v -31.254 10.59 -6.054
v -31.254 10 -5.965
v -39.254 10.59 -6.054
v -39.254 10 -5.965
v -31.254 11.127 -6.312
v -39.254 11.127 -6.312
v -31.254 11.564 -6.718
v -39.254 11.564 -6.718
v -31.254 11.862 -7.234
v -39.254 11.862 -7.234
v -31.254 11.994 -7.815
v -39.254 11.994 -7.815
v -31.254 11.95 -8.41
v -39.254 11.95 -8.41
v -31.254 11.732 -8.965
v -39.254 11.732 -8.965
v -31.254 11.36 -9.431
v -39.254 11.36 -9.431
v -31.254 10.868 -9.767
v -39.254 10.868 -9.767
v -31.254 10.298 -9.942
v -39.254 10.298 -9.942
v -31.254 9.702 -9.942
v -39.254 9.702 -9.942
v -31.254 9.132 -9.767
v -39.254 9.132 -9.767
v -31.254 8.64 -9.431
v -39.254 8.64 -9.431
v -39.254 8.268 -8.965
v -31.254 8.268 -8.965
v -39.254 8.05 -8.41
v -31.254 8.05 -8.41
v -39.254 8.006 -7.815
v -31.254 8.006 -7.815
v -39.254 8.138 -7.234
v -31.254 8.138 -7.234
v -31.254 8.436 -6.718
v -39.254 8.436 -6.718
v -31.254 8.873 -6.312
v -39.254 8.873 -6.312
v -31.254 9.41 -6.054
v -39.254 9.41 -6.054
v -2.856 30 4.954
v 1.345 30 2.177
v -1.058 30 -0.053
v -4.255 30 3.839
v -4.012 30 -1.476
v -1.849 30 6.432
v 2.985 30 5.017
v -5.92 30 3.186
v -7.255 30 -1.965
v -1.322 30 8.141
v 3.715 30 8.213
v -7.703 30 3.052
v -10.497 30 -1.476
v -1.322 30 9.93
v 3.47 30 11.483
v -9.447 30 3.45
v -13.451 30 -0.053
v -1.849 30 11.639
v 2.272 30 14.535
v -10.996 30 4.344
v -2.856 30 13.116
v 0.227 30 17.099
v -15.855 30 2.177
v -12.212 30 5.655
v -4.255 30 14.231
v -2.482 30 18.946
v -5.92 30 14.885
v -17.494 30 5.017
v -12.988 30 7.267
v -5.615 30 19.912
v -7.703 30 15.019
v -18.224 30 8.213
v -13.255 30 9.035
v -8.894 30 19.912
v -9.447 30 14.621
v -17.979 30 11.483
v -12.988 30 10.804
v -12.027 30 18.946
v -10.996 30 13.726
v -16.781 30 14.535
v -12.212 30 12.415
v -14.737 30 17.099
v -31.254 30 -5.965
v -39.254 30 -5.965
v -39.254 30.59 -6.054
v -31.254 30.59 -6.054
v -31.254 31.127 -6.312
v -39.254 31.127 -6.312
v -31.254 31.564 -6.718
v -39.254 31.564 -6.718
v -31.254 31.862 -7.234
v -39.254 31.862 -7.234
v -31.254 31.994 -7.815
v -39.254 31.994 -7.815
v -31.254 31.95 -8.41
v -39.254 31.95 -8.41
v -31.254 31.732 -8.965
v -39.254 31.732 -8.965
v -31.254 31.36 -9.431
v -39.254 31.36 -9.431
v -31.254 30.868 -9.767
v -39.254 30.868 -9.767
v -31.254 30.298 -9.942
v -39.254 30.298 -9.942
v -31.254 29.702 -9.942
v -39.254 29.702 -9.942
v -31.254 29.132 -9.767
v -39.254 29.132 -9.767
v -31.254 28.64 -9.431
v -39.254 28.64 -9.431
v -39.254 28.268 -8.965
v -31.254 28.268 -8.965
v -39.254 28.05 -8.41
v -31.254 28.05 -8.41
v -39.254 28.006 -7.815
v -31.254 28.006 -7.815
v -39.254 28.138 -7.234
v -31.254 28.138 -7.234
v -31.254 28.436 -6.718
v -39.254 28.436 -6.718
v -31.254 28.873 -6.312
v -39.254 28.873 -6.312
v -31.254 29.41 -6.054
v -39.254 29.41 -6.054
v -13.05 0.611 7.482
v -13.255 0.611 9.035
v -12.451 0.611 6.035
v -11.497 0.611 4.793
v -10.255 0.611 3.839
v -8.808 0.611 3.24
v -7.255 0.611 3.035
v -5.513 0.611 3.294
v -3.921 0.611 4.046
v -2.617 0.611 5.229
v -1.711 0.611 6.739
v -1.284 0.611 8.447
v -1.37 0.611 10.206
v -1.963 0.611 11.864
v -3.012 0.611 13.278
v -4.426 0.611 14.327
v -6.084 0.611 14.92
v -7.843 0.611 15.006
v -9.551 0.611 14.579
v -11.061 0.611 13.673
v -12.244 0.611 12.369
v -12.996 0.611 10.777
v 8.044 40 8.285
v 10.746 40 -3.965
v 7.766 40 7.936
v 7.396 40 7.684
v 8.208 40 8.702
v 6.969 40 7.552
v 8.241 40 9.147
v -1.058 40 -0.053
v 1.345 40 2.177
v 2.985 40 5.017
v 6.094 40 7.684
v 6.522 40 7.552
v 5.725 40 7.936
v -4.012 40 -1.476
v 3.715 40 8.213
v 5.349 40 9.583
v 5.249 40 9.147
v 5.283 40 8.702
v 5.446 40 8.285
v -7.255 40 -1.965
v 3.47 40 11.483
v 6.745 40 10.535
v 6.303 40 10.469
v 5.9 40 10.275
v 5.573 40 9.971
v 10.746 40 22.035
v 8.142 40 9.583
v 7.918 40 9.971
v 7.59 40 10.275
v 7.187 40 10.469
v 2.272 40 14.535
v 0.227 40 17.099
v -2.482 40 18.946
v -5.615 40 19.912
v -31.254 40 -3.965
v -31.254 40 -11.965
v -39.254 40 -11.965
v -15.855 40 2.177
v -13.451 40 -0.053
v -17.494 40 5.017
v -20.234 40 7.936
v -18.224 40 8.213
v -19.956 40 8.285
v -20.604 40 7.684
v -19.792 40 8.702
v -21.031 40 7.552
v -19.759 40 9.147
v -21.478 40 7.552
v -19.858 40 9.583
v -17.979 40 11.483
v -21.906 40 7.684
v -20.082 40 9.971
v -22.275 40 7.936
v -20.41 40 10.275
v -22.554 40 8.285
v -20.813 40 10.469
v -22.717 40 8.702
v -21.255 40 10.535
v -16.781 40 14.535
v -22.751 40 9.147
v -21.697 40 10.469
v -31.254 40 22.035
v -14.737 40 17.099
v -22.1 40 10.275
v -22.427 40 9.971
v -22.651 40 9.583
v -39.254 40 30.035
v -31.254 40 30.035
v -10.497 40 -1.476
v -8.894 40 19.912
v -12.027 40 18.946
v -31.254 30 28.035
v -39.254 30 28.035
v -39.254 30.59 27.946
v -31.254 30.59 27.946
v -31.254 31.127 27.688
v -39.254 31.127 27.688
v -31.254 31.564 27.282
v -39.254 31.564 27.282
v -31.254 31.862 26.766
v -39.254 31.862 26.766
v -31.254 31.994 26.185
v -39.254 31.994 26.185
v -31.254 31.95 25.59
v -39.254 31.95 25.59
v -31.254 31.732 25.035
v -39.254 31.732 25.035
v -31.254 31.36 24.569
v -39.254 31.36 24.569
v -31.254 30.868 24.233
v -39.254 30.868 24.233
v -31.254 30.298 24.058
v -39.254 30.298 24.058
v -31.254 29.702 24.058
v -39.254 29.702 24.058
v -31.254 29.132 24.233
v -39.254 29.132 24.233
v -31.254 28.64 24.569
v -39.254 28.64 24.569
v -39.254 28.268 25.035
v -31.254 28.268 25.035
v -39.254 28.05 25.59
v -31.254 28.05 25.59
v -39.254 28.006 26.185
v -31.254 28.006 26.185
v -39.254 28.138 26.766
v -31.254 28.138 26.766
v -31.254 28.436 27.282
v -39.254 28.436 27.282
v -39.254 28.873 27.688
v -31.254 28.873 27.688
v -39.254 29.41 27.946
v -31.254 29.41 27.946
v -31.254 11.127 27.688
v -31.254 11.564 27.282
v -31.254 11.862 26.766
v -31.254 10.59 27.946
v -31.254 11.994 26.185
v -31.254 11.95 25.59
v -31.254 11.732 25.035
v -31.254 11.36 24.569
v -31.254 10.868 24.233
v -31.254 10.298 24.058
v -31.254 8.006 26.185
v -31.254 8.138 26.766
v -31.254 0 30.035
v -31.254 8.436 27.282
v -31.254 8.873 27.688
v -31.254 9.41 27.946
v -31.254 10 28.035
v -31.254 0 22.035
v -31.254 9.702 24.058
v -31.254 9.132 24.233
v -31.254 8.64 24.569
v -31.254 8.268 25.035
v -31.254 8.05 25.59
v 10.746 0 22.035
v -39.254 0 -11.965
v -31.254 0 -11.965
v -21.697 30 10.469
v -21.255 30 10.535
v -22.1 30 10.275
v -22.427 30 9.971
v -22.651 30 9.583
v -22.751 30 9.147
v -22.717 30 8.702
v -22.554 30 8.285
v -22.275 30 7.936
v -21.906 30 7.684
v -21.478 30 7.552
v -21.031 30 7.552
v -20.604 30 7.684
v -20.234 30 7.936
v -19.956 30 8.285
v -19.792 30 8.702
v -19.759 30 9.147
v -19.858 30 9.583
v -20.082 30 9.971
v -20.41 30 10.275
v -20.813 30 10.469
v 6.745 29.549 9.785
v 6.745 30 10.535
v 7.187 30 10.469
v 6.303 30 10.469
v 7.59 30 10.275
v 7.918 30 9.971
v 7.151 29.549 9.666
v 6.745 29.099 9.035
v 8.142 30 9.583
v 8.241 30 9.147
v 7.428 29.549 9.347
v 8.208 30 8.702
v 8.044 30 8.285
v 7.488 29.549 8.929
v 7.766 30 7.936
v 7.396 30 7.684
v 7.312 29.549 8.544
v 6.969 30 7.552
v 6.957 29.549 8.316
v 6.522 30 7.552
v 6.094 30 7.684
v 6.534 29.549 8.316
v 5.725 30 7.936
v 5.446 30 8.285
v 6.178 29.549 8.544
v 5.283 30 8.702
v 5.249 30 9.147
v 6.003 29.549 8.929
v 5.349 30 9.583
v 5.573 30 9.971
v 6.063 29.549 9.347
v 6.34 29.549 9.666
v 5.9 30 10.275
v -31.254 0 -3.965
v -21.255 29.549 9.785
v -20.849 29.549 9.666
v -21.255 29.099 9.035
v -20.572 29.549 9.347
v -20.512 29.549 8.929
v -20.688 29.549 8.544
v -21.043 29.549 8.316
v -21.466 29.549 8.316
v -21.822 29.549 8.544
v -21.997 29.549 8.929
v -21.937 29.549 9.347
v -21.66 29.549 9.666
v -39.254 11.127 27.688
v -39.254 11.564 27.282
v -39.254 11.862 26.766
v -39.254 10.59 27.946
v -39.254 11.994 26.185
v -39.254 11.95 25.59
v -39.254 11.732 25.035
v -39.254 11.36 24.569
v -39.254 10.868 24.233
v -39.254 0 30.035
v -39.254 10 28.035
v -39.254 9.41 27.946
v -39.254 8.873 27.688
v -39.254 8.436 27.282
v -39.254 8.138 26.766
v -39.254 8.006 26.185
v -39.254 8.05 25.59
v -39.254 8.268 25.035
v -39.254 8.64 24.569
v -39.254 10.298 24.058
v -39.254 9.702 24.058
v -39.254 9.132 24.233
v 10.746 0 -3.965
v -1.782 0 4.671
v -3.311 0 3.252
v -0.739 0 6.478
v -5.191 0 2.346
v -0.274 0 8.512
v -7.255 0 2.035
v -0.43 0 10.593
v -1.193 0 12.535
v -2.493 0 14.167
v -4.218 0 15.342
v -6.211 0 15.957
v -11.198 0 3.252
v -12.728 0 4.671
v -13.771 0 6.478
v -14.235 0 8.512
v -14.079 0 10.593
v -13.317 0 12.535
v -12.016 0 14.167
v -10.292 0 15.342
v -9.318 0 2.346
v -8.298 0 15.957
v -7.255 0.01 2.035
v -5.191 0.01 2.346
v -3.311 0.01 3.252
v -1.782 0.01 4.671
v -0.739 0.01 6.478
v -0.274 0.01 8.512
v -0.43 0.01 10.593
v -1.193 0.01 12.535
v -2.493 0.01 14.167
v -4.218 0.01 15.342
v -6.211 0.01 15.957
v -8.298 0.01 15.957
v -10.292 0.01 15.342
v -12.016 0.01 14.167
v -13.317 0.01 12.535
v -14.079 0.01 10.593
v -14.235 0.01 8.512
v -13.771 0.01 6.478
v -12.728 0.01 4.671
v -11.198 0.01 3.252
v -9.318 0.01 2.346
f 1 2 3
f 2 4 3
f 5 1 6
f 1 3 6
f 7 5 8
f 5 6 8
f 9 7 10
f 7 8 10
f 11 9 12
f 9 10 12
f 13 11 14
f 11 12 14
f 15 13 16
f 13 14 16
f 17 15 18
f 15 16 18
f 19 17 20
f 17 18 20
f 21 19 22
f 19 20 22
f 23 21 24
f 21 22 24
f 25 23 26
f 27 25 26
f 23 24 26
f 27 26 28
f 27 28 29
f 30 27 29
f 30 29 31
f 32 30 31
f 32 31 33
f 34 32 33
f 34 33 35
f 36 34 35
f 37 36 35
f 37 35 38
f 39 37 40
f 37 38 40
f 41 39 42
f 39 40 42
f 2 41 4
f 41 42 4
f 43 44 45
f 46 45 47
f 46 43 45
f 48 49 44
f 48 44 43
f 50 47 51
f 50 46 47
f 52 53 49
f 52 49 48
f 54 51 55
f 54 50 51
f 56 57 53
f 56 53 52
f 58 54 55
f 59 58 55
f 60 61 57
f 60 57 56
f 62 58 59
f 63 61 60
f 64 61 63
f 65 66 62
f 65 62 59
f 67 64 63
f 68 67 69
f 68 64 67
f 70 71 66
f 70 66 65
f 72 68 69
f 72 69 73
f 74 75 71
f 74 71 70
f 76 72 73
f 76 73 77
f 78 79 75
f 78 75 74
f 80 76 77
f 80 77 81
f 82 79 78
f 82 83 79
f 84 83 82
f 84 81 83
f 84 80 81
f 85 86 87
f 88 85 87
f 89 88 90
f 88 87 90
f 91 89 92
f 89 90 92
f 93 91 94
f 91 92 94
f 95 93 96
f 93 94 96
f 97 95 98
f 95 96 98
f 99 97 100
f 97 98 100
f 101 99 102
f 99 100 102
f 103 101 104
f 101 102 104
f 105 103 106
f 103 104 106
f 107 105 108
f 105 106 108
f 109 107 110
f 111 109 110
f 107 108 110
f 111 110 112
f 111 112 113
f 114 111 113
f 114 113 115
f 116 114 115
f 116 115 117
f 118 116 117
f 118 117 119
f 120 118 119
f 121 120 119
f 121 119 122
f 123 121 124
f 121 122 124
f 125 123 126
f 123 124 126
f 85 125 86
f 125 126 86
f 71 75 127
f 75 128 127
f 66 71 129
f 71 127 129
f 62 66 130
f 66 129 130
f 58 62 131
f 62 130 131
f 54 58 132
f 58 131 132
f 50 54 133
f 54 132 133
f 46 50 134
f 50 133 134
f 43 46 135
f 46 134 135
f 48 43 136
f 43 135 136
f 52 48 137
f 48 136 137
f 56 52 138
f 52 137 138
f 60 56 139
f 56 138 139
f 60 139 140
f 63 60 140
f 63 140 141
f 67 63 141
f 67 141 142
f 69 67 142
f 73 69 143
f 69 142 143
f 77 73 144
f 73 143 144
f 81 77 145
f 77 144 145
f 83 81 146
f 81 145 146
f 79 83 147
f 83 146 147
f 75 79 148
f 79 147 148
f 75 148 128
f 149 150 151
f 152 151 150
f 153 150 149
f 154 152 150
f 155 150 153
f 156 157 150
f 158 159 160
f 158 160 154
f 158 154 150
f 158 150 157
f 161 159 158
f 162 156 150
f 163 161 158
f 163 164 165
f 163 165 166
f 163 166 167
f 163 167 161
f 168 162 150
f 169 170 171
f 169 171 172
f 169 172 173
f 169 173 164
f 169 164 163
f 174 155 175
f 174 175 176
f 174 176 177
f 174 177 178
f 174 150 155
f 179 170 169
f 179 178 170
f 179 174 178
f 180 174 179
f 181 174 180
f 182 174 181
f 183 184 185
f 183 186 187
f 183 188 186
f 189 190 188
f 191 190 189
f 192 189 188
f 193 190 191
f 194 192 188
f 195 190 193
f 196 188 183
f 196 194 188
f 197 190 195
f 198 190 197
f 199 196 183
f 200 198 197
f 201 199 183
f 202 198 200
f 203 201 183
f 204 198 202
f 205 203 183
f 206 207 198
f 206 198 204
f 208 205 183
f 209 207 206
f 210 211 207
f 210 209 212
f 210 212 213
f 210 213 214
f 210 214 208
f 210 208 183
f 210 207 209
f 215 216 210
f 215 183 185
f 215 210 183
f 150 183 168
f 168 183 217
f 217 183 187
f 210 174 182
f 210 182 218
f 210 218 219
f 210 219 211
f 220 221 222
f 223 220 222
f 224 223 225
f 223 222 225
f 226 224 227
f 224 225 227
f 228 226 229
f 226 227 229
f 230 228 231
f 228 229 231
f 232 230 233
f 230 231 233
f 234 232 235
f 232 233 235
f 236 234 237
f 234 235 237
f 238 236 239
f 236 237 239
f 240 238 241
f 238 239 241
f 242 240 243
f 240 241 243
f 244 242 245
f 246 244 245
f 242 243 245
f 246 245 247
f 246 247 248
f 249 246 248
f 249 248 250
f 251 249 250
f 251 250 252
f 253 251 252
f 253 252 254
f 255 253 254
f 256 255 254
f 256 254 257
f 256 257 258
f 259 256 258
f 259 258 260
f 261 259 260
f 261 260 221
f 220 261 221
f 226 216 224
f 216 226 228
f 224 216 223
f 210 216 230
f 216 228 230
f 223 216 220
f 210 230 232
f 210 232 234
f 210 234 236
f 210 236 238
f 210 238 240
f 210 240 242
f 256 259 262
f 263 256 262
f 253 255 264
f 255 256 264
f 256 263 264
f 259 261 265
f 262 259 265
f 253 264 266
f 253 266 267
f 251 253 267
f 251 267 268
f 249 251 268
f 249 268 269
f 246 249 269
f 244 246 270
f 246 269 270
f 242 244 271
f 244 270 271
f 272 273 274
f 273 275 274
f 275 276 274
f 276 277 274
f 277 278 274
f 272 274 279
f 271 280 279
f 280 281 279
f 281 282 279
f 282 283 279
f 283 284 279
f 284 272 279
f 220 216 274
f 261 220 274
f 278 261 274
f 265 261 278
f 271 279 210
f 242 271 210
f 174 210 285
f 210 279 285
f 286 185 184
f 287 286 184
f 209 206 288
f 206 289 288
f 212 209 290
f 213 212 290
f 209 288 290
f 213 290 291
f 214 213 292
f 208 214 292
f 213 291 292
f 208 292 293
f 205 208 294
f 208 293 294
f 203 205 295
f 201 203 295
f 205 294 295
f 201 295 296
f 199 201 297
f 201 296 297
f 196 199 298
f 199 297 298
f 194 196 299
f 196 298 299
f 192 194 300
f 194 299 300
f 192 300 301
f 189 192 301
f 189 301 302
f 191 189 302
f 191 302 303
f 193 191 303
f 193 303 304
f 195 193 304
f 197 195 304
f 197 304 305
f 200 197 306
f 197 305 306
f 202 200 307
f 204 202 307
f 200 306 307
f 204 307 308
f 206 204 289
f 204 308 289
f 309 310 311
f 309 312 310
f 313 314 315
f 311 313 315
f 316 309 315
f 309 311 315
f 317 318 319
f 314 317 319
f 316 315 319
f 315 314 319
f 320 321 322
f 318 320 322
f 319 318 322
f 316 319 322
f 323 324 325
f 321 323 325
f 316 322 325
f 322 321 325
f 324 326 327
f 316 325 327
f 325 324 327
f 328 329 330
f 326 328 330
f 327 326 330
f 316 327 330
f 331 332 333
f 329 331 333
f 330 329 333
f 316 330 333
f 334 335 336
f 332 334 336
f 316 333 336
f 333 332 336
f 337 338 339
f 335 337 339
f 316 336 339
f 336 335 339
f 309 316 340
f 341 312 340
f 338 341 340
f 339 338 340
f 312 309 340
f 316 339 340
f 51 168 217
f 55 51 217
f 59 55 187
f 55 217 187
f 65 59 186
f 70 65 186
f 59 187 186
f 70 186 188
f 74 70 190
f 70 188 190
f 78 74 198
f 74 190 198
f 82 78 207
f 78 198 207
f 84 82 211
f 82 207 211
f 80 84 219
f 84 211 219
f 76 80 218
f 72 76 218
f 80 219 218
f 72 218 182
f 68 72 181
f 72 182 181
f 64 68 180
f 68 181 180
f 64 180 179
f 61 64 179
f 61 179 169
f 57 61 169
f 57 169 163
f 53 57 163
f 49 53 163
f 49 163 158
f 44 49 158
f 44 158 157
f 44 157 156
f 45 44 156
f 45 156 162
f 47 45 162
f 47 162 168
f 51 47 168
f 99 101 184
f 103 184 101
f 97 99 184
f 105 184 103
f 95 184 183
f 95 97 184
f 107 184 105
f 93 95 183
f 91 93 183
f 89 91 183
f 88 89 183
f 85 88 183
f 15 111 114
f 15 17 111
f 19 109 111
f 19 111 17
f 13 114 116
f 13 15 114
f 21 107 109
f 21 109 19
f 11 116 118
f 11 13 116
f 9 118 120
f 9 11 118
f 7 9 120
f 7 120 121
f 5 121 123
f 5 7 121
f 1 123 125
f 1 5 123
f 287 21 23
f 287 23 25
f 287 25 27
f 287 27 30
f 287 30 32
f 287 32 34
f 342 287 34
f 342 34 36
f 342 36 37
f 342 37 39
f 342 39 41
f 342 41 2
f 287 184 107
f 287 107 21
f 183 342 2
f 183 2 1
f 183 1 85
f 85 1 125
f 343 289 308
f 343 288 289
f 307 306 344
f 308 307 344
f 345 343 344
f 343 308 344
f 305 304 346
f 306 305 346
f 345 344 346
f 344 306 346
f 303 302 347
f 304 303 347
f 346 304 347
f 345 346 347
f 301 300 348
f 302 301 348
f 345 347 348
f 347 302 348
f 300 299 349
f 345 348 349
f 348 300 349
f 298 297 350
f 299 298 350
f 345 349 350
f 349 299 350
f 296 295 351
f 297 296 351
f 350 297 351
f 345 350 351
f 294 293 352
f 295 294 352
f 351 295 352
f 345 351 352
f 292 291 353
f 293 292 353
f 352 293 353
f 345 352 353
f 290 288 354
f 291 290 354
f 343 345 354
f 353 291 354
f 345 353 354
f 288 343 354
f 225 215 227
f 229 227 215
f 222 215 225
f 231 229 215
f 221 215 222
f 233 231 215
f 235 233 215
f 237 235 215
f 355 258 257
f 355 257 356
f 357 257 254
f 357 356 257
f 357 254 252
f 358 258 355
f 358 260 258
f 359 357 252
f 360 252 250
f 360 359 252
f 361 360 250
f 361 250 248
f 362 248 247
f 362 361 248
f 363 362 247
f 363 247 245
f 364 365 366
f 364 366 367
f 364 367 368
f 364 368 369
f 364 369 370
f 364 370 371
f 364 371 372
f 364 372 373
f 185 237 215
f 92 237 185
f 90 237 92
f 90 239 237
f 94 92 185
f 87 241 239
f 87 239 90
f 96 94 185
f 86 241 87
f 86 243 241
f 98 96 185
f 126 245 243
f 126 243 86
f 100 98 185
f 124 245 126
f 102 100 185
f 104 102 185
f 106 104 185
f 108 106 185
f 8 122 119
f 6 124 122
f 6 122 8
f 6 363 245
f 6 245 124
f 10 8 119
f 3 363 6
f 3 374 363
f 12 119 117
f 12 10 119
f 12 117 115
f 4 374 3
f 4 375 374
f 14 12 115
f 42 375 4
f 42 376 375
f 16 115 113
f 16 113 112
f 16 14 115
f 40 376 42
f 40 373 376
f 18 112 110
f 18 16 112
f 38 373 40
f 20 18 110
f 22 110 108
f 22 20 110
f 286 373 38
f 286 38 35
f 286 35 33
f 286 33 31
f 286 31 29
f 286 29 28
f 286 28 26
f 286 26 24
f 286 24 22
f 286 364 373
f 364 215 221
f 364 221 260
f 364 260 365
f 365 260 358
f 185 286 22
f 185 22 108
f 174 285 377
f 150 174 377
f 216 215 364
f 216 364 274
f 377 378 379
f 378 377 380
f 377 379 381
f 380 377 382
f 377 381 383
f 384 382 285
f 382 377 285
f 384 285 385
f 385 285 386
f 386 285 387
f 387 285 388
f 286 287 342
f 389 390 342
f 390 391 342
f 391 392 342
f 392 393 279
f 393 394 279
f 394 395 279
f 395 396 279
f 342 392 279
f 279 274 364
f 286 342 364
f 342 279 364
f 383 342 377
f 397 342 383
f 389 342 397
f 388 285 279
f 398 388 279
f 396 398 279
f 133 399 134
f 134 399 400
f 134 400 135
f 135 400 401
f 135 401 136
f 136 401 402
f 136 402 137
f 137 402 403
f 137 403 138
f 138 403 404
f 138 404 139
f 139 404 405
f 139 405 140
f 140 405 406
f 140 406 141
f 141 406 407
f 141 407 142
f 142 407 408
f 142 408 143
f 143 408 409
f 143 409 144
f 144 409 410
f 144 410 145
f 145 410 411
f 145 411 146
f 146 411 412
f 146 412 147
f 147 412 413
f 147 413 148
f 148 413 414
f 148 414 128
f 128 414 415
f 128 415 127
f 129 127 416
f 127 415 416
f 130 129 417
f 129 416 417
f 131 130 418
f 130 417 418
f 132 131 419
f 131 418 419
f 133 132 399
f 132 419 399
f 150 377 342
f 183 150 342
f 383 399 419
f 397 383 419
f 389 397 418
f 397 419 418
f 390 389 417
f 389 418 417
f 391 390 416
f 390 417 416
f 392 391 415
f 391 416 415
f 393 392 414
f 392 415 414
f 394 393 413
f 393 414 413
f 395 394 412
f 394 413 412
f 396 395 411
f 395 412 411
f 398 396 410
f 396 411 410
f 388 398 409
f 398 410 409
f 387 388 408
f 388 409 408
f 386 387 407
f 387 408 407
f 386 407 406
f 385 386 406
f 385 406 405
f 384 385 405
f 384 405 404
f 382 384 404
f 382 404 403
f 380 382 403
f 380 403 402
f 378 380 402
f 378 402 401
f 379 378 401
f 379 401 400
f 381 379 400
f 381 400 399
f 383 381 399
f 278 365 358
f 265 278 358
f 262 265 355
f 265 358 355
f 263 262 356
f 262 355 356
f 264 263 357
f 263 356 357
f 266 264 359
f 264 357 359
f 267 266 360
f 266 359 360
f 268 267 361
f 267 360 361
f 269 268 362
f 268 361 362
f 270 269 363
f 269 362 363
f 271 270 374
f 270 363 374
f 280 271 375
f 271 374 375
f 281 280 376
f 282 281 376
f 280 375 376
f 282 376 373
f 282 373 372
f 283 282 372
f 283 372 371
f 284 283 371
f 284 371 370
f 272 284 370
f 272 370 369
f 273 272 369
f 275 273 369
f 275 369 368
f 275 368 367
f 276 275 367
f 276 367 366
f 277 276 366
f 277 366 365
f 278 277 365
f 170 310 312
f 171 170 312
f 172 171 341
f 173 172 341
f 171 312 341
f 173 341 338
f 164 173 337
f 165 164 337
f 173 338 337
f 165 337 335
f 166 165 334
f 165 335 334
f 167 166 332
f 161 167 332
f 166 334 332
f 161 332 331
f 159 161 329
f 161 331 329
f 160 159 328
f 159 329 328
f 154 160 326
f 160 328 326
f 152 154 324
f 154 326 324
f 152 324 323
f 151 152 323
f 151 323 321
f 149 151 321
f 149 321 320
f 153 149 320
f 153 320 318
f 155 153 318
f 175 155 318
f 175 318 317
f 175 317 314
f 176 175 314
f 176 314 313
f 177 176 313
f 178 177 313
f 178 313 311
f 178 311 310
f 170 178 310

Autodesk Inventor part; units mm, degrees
ref_plane "YZ Plane" through (0, 0, 0) normal (1, 0, 0) x (0, 1, 0)
ref_plane "XZ Plane" through (0, 0, 0) normal (0, 1, 0) x (-1, 0, 0)
ref_plane "XY Plane" through (0, 0, 0) normal (0, 0, 1) x (1, 0, 0)
sketch "Boceto14" plane through (0, 0, 0) normal (0, 1, 0) x (-1, 0, 0)
  line L0 (39.2545, 8.1893) -> (39.2545, -3.9647)
  line L1 (39.2545, -3.9647) -> (39.2545, 20.0353)
  line L2 (31.2545, 22.0353) -> (-2.7455, 22.0353)
  line L3 (-4.7455, -3.9647) -> (31.2545, -3.9647)
  line L4 (39.2545, 20.0353) -> (39.2545, 30.0353)
  line L5 (39.2545, -3.9647) -> (39.2545, -11.9647)
  circle A0 centre (7.2547, 9.0353) radius 11
  line L6 (-2.7455, 22.0353) -> (-8.7455, 22.0353)
  line L7 (-8.7455, -3.9647) -> (-4.7455, -3.9647)
  line L8 (-8.7455, 22.0353) -> (-10.7455, 22.0353)
  line L9 (-10.7455, 22.0353) -> (-10.7455, -3.9647)
  line L10 (-10.7455, -3.9647) -> (-8.7455, -3.9647)
  circle A1 centre (7.2547, 9.0353) radius 6
  line L11 (39.2545, -11.9647) -> (31.2545, -11.9647)
  line L12 (31.2545, -11.9647) -> (31.2545, -3.9647)
  line L13 (39.2545, 30.0353) -> (31.2545, 30.0353)
  line L14 (31.2545, 30.0353) -> (31.2545, 22.0353)
  point P0 (0, 0)
  dimension "d81" = 42
  dimension "d122" = 22
  dimension "d151" = 2
  dimension "d165" = 31.9998
  dimension "d166" = 12
  dimension "d171" = 13
  dimension "d182" = 8
  dimension "d183" = 8
  dimension "d185" = 8
  dimension "d186" = 8
extrude "Extrusión14" add sketch "Boceto14" along normal blind 40 contours L0 L5 L11 L12 L3 L7 L10 L9 L8 L6 L2 L14 L13 L4 L1 | A0 | A1
sketch "Boceto23" plane through (0, 0, 0) normal (0, -1, 0) x (1, 0, 0)
  point P0 (0, 0)
hole "Agujero1" at (-7.2547, 0, 9.0353) direction (0, 1, 0) diameter 22 depth 40 tip angle 118
extrude "Extrusión20" add sketch "Boceto14" along normal blind 30 contours A0
sketch "Boceto26" plane through (-39.2545, 0, -11.9647) normal (-1, 0, 0) x (0, 0, 1)
  line L0 (42, 0) -> (42, 40) projected
  line L1 (42, 0) -> (38, 0)
  line L2 (0, 0) -> (42, 0) projected
  line L3 (38, 0) -> (38, 40)
  line L4 (0, 40) -> (42, 40) projected
  line L5 (8, 0) -> (0, 0) projected
  line L6 (0, 0) -> (4, 0)
  line L7 (4, 0) -> (4, 40)
  line L8 (38, 40) -> (38, 30)
  line L9 (38, 30) -> (4, 30)
  line L10 (4, 0) -> (4, 10)
  line L11 (4, 10) -> (38, 10)
  circle A0 centre (38, 10) radius 2
  circle A1 centre (4, 10) radius 2
  circle A2 centre (4, 30) radius 2
  circle A3 centre (38, 30) radius 2
  point P0 (11.9647, 0)
  dimension "d200" = 4
  dimension "d201" = 4
  dimension "d202" = 10
  dimension "d203" = 10
  dimension "d204" = 4
  dimension "d205" = 4
  dimension "d206" = 4
  dimension "d207" = 4
extrude "Extrusión21" cut sketch "Boceto26" against normal blind 30 contours A0 L11 L3 | L3 A0 | A3 L3 | L3 L9 A3 | L11 A0 L3 | L3 A3 L9 | A2 L9 L7 | L7 A2 | A1 L7 | L7 L11 A1 | L11 L7 A1 | A2 L7 L9
thread "Rosca11" size "M12x1.5" class "6H" standard "ISO Metric profile" length 430
hole "Agujero3" at (-7.2547, 0, 9.0353) direction (0, 1, 0) diameter 14 depth 0.01 tip angle 118
sketch "Boceto27" plane through (0, 40, 0) normal (0, 1, 0) x (1, 0, 0)
  circle A0 centre (-7.2547, -9.0353) radius 6 projected
  line L0 (-7.2547, -9.0353) -> (6.7453, -9.0353)
  line L1 (6.7453, -9.0353) -> (-21.2547, -9.0353)
  circle A1 centre (6.7453, -9.0353) radius 1.5
  circle A2 centre (-21.2547, -9.0353) radius 1.5
  point P0 (0, 0)
  dimension "d226" = 14
  dimension "d227" = 28
  dimension "d228" = 3
  dimension "d229" = 3
hole "Agujero4" at (-21.2547, 40, 9.0353) at (6.7453, 40, 9.0353) direction (0, -1, 0) diameter 3 depth 10 tip angle 118
thread "Rosca12" size "M3x0.5" class "6H" standard "ISO Metric profile" length 7
thread "Rosca13" size "M3x0.5" class "6H" standard "ISO Metric profile" length 7
properties part number "Soporte de tuerca de mesa" material "Aluminum 6061"
